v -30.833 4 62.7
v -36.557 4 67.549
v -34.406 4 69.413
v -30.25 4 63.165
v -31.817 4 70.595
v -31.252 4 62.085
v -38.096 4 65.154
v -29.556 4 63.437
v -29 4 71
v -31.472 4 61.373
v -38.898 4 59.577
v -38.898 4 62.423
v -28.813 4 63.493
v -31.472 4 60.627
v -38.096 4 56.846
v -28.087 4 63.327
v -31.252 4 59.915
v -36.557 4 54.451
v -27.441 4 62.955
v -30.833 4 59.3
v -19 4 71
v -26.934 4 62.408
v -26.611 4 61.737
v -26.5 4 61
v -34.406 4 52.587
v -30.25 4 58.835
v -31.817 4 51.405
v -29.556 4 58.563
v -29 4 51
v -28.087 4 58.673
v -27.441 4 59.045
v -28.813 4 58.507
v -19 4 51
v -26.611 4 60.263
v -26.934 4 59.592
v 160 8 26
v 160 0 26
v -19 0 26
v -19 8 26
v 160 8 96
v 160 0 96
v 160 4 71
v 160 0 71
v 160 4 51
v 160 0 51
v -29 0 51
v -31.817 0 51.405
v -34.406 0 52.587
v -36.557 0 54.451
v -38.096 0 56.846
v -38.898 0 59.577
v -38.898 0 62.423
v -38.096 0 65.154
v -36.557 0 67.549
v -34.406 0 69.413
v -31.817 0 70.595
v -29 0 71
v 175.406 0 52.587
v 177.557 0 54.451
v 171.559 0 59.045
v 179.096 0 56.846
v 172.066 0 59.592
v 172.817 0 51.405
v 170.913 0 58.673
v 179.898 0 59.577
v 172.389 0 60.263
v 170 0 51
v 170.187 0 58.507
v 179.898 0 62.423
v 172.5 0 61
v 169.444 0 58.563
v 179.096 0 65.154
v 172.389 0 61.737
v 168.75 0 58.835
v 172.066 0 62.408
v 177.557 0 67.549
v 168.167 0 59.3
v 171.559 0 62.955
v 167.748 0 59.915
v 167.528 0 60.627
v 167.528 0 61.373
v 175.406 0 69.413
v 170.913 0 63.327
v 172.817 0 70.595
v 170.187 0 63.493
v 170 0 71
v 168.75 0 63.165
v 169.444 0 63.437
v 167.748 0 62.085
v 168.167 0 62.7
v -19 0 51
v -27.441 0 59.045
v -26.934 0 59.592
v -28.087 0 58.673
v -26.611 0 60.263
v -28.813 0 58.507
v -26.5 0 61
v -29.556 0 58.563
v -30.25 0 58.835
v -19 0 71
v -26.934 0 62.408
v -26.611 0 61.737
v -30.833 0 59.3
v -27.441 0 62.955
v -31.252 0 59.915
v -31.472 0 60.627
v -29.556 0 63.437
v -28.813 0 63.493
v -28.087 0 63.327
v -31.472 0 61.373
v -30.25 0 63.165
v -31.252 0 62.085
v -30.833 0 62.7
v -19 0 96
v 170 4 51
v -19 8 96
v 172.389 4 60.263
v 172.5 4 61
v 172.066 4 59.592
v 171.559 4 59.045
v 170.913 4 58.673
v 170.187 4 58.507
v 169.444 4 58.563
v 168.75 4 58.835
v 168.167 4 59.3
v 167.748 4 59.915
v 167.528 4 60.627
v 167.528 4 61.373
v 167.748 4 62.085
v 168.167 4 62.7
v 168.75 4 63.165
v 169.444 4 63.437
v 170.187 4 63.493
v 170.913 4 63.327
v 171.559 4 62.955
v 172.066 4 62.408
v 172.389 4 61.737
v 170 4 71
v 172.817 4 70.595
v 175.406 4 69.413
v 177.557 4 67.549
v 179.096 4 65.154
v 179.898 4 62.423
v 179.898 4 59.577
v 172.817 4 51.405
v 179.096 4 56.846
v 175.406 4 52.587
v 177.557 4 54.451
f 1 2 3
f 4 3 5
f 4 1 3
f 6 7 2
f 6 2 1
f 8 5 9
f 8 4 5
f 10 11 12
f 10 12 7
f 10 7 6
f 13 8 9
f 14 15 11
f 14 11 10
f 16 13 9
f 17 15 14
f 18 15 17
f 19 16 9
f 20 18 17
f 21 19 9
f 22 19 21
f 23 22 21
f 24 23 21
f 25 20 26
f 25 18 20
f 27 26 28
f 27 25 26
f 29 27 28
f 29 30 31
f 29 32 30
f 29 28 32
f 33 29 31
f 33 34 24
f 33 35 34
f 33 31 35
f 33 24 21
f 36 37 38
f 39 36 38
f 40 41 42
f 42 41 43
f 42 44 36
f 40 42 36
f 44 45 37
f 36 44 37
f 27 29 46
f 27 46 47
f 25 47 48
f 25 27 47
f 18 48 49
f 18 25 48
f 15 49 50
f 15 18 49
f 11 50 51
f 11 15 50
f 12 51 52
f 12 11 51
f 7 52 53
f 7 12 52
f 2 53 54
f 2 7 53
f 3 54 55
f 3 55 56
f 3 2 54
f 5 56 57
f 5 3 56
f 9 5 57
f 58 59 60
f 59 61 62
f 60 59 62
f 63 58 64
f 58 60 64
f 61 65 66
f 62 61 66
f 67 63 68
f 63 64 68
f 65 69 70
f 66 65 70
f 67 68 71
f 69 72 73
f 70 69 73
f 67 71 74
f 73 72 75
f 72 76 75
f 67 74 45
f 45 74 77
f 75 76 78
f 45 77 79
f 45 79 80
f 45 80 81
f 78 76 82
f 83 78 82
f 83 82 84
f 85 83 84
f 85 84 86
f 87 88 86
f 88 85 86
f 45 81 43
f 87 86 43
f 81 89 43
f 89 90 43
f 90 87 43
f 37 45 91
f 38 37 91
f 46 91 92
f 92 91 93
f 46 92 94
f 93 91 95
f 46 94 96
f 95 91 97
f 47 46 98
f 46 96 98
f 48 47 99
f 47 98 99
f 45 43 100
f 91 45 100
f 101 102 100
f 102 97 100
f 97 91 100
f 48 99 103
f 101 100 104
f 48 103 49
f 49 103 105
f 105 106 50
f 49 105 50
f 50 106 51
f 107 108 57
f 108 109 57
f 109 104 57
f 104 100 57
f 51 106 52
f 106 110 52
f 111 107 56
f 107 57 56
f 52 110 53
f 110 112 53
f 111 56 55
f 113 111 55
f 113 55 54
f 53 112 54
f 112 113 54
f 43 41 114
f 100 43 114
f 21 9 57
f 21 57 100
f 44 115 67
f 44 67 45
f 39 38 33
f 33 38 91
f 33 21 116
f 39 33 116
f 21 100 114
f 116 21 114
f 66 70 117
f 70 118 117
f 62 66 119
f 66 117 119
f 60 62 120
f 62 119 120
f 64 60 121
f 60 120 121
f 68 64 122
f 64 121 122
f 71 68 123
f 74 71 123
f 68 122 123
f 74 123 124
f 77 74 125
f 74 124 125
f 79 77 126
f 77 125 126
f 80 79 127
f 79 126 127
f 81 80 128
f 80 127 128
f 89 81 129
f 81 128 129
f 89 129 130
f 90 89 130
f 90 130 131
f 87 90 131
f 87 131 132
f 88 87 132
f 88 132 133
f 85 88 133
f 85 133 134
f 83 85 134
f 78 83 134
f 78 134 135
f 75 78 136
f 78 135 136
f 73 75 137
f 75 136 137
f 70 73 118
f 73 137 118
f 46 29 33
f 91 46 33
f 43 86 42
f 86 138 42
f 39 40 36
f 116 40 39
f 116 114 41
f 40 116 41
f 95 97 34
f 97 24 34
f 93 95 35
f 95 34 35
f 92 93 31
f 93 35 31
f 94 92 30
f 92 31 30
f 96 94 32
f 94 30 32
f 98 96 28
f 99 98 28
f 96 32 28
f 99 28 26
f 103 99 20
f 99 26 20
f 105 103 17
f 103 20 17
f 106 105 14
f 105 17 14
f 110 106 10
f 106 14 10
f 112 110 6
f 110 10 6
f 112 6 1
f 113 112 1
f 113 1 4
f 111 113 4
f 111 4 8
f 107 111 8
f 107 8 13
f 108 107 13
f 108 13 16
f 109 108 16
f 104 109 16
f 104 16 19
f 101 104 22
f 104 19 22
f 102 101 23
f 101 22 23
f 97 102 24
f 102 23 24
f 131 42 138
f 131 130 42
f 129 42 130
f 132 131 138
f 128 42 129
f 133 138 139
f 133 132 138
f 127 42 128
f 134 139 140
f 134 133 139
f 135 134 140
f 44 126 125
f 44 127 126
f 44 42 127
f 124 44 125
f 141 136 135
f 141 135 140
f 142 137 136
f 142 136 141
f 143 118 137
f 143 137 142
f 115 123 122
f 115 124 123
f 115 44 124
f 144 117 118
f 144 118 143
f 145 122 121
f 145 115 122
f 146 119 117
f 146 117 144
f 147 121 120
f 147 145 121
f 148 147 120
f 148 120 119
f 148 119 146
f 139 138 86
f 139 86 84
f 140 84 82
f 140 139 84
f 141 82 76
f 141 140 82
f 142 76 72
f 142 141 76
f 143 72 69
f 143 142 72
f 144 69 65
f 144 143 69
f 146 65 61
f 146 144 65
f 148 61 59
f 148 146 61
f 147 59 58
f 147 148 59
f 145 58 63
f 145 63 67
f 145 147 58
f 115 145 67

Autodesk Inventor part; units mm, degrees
ref_plane "YZ Plane" through (0, 0, 0) normal (1, 0, 0) x (0, 1, 0)
ref_plane "XZ Plane" through (0, 0, 0) normal (0, 1, 0) x (-1, 0, 0)
ref_plane "XY Plane" through (0, 0, 0) normal (0, 0, 1) x (1, 0, 0)
sketch "Sketch1" plane through (0, 0, 0) normal (0, 1, 0) x (-1, 0, 0)
  line L0 (19, 96) -> (-160, 96)
  line L1 (-160, 96) -> (-160, 26)
  line L2 (-160, 26) -> (19, 26)
  line L3 (19, 26) -> (19, 96)
  point P0 (0, 0)
  dimension "d0" = 179
  dimension "d1" = 70
extrude "Extrusion1" add sketch "Sketch1" along normal blind 8
sketch "Sketch2" plane through (0, 8, 0) normal (0, 1, 0) x (1, 0, 0)
  circle A0 centre (-29, -61) radius 10
  line L0 (-29, -71) -> (-14.7125, -71)
  line L1 (-29, -51) -> (-14.2875, -51)
  line L2 (-14.7125, -71) -> (-14.2875, -51)
  line L3 (160, -26) -> (-19, -26) projected
  line L4 (70.5, -26) -> (70.5, -114.3)
  circle A1 centre (170, -61) radius 10
  line L5 (170, -71) -> (155.7125, -71)
  line L6 (170, -51) -> (155.2875, -51)
  line L7 (155.7125, -71) -> (155.2875, -51)
  line L8 (-19, -96) -> (160, -96) projected
  line L9 (-19, -26) -> (-19, -96) projected
  point P0 (0, 0)
  point P1 (-19, -61)
  dimension "d5" = 20
  dimension "d14" = 25
  dimension "d16" = 10
extrude "Extrusion2" add sketch "Sketch2" against normal blind 8 contours A0 | L9 L0 A0 | A0 L1 L9 | L9 L1 L2 L0 | A1 | A1 L5 L7 L6
sketch "Sketch3" plane through (0, 8, 0) normal (0, 1, 0) x (1, 0, 0)
  arc A0 (-29, -51) -> (-29, -71) centre (-29, -61) ccw projected
  circle A1 centre (-29, -61) radius 2.5
  arc A2 (170, -71) -> (170, -51) centre (170, -61) ccw projected
  circle A3 centre (170, -61) radius 2.5
  point P0 (0, 0)
  dimension "d8" = 5
  dimension "d9" = 5
extrude "Extrusion3" cut sketch "Sketch3" against normal blind 8
sketch "Sketch4" plane through (0, 8, 0) normal (0, 1, 0) x (1, 0, 0)
  line L0 (-19, -26) -> (-19, -96) projected
  line L1 (-19, -41.275) -> (-45.0875, -41.275)
  line L2 (-45.0875, -41.275) -> (-45.0875, -80.9625)
  line L3 (-45.0875, -80.9625) -> (-19, -80.9625)
  line L4 (-19, -80.9625) -> (-19, -41.275)
  line L5 (160, -96) -> (160, -26) projected
  line L6 (160, -41.275) -> (180.975, -41.275)
  line L7 (180.975, -41.275) -> (180.975, -82.55)
  line L8 (180.975, -82.55) -> (160, -82.55)
  line L9 (160, -82.55) -> (160, -41.275)
  point P0 (0, 0)
  point P1 (-19, -51)
  point P2 (160, -51)
  point P3 (160, -82.55)
  point P4 (-19, -80.9625)
extrude "Extrusion4" cut sketch "Sketch4" against normal blind 4
properties part number "Fuslage cover"
